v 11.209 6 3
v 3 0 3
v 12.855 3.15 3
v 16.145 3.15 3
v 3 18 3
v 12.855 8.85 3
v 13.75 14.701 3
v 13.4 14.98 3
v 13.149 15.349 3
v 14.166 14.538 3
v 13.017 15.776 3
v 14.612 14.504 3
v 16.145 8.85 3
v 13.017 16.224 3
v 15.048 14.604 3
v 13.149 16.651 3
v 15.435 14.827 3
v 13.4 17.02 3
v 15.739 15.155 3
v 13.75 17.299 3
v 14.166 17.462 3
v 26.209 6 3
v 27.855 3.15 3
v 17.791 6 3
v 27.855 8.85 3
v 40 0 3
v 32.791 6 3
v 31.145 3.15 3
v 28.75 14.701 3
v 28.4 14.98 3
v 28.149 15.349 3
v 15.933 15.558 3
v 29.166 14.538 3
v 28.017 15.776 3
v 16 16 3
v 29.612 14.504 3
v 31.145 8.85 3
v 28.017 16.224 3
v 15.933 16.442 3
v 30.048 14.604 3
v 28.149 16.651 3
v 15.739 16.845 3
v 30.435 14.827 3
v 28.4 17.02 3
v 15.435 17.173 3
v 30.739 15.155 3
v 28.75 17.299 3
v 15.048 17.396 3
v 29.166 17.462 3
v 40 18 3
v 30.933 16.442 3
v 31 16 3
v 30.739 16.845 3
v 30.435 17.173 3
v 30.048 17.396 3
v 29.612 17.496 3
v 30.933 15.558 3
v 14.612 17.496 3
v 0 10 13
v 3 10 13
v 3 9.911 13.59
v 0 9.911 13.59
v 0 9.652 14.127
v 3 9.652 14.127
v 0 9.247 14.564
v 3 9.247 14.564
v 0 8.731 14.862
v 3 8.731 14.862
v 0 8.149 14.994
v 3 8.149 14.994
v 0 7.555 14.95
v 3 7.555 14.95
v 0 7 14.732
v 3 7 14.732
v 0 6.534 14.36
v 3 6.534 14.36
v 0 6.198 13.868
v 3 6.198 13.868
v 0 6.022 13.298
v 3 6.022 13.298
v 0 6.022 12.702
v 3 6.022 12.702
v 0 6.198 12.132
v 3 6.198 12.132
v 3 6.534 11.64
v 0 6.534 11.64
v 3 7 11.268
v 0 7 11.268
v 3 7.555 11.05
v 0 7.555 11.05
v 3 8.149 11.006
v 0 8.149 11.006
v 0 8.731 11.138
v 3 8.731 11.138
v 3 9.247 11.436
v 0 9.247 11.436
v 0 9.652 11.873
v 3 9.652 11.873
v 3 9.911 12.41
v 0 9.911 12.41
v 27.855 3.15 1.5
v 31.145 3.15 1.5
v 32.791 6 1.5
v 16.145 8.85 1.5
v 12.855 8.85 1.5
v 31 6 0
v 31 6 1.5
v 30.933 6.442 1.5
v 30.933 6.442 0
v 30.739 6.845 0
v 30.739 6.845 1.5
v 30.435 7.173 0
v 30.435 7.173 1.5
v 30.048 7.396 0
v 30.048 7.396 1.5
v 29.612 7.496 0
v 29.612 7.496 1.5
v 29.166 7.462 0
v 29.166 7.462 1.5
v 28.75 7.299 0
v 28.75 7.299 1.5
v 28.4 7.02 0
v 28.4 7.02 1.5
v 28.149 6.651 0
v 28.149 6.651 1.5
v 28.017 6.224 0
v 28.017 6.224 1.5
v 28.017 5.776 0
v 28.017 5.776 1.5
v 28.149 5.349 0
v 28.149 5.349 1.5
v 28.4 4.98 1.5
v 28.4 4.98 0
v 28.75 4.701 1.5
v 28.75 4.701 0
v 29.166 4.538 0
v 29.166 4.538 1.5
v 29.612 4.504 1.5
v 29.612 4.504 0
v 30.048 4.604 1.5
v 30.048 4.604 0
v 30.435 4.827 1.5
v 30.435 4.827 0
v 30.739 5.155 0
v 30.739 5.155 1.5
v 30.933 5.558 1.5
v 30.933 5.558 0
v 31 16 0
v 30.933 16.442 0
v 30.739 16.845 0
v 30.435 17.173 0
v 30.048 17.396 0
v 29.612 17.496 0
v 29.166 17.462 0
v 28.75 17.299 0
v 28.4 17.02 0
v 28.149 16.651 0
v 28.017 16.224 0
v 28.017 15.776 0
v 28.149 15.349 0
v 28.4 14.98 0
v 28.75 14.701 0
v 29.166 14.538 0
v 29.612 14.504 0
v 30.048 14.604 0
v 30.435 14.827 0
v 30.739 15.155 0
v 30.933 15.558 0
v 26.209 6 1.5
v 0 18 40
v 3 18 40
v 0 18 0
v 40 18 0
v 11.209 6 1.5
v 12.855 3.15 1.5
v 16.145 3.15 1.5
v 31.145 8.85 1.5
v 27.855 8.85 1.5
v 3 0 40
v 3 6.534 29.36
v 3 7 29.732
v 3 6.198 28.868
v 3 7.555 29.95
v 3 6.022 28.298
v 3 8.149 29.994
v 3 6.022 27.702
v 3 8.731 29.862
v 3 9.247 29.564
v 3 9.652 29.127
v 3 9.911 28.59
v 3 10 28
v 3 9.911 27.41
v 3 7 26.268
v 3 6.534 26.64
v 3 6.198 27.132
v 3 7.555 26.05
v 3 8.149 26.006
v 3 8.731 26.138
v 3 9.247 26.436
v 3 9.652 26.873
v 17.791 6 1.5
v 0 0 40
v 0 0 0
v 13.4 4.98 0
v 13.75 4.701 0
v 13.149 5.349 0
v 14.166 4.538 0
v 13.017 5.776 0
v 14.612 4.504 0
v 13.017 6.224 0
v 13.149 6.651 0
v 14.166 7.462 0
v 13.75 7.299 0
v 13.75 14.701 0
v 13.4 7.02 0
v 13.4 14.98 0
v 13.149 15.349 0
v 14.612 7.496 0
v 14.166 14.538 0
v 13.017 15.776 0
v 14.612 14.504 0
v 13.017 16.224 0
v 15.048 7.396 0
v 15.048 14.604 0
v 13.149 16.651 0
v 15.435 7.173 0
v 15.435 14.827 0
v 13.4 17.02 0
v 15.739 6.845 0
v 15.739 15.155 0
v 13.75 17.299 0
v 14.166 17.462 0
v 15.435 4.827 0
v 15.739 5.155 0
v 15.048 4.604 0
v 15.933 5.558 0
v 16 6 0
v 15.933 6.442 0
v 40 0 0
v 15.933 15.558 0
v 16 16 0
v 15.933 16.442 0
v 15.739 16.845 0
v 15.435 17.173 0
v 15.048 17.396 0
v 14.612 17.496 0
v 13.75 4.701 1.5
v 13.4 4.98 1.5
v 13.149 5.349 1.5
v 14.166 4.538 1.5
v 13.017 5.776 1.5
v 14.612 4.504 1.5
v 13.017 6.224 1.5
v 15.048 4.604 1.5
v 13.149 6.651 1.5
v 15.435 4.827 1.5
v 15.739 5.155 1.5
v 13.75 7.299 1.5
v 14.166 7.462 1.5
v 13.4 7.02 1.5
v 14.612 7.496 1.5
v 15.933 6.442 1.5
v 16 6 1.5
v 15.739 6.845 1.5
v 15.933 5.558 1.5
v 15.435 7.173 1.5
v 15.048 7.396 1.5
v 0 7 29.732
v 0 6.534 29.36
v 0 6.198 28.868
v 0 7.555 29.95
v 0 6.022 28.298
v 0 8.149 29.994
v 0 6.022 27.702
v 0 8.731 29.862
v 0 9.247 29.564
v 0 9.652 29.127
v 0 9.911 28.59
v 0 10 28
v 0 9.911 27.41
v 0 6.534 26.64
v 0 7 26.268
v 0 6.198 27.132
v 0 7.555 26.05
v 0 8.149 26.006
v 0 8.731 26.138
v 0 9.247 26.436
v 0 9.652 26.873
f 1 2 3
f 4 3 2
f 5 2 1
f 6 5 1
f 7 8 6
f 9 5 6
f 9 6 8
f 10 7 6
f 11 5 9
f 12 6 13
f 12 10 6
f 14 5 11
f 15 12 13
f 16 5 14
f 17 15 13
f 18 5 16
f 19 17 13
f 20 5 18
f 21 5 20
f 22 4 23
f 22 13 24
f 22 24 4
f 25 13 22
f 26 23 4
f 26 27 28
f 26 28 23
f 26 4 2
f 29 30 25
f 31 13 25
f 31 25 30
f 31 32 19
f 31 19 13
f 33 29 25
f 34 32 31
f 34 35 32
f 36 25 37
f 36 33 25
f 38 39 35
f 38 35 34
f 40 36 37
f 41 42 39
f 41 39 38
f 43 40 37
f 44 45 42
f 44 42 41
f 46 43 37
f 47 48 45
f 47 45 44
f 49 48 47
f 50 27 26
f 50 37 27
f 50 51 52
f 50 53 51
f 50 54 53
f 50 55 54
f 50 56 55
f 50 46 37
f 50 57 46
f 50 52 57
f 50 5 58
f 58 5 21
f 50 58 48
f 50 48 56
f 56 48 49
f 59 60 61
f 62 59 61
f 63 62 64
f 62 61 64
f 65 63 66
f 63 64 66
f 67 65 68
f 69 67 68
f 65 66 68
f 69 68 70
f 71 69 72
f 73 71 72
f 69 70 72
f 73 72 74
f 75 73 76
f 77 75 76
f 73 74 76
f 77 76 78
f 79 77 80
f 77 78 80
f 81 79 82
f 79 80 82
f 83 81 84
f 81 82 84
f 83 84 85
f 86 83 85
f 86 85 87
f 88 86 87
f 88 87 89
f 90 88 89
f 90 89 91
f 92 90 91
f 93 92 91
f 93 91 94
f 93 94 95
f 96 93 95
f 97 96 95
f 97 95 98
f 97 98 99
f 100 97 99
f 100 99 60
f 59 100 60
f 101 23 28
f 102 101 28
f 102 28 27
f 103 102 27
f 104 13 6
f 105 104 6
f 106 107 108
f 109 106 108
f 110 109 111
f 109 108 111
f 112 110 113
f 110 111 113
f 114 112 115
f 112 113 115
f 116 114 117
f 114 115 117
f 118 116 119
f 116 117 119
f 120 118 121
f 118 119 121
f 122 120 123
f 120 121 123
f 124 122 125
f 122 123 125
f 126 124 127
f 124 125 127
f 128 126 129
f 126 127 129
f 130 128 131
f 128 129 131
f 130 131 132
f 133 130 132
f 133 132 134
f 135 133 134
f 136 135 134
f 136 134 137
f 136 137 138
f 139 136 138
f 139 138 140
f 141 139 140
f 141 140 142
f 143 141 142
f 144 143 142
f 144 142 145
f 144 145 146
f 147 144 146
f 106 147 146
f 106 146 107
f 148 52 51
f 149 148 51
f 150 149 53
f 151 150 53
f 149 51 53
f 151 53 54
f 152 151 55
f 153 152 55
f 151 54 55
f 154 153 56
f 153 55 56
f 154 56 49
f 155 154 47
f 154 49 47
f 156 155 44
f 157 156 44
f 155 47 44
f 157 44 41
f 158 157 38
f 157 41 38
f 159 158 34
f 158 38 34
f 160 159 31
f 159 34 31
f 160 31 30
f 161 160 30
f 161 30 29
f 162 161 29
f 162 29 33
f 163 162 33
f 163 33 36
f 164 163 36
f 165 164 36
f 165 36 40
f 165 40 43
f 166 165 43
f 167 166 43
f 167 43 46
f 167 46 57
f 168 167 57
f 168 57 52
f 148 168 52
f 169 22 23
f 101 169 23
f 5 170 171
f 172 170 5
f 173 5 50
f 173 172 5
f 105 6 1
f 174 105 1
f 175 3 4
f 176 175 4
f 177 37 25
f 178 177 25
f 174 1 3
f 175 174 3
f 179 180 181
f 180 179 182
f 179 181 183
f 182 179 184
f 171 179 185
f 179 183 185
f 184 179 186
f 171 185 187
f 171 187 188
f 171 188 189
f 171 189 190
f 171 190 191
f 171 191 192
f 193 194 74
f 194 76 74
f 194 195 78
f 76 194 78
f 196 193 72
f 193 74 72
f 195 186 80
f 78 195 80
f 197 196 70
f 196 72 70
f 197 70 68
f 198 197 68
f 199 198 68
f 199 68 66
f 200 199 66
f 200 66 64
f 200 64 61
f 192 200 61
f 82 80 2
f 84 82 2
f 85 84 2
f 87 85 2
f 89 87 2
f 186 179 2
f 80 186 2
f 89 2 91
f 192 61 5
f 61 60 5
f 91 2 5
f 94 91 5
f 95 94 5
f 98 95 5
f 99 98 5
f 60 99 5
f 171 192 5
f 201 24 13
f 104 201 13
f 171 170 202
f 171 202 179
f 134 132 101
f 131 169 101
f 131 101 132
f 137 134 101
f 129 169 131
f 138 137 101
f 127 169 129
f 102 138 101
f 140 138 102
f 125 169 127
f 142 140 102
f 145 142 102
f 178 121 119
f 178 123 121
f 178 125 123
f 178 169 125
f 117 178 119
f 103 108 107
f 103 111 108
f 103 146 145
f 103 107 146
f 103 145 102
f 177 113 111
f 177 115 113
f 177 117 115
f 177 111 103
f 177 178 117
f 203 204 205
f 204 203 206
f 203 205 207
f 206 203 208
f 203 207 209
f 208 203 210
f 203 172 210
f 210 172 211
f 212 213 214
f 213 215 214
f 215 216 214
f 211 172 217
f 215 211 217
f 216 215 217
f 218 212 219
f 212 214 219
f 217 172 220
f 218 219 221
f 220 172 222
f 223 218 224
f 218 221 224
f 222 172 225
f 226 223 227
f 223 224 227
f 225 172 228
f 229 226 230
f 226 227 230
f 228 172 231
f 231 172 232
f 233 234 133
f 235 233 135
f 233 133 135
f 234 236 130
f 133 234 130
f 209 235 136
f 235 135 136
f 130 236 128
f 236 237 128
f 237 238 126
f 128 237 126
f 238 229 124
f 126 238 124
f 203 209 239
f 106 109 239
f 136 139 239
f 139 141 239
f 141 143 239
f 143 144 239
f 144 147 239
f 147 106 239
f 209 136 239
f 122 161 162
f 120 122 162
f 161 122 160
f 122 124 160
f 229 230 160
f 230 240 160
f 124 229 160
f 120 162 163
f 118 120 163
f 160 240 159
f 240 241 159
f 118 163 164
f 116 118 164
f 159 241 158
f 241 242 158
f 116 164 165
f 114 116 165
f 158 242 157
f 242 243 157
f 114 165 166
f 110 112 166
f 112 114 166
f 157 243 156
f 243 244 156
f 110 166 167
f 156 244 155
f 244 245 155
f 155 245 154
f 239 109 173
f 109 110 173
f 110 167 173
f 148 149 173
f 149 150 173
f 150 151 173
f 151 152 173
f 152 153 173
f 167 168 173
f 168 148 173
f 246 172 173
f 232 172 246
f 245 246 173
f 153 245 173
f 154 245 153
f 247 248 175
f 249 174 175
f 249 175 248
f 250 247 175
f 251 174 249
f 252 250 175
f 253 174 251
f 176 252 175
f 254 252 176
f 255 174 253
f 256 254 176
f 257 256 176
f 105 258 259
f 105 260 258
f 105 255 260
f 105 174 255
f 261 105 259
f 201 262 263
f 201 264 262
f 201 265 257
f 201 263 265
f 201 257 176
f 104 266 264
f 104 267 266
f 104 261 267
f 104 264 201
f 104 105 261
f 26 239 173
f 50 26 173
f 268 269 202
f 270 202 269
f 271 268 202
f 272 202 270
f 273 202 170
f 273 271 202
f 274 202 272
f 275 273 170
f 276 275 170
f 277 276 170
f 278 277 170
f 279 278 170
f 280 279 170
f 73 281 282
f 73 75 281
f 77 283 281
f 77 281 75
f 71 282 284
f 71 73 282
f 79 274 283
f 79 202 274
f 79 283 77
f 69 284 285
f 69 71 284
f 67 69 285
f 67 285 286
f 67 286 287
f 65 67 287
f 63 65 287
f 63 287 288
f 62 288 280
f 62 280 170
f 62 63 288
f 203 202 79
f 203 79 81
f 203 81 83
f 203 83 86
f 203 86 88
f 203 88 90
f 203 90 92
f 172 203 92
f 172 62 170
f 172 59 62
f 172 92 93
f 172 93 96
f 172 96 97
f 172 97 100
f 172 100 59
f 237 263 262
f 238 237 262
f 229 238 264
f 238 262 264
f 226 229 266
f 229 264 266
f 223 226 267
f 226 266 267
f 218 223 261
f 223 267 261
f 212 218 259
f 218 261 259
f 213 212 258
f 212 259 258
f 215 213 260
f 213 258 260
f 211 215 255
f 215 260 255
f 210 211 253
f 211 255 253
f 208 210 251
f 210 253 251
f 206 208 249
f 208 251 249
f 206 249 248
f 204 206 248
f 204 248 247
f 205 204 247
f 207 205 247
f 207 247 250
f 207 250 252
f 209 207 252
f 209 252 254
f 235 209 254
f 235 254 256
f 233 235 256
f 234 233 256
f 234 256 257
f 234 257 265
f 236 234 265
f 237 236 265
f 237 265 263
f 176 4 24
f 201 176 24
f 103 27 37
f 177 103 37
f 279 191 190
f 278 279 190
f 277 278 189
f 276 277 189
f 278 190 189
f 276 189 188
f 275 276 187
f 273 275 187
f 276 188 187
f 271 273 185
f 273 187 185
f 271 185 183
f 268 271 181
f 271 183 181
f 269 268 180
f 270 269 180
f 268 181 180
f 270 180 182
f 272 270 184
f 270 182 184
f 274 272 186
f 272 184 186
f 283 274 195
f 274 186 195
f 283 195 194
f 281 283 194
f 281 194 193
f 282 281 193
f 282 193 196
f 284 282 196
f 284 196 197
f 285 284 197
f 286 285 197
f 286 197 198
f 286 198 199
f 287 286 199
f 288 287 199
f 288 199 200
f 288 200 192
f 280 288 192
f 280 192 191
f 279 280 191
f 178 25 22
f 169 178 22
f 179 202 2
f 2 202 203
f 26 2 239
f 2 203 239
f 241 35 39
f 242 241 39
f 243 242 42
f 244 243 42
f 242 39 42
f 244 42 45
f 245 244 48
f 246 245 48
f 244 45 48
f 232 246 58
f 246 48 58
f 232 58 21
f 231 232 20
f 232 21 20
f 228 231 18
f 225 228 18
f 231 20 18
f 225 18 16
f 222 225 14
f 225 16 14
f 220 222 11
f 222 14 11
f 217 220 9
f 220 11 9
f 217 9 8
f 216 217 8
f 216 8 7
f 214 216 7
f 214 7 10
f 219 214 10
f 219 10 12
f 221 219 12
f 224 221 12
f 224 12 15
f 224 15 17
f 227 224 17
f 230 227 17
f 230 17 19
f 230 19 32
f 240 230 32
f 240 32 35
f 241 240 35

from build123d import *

# Parameters (mm, degrees)
ESQUISSE1_W             = 40
ESQUISSE1_H             = 18
BOSS_EXTRU_1_DEPTH      = 3
ESQUISSE2_W             = 3
ESQUISSE2_H             = 18
BOSS_EXTRU_2_DEPTH      = 37
ESQUISSE3_R             = 1.5
ENL_V_MAT_EXTRU_1_DEPTH = 58.384666942
ESQUISSE4_R             = 2
ENL_V_MAT_EXTRU_2_DEPTH = 58.384666942
ENL_V_MAT_EXTRU_3_DEPTH = 1.5


with BuildPart() as part:
    # Esquisse1 → Boss.-Extru.1 (new body)
    with BuildSketch(Plane.XY):
        with Locations((20, 9)):
            Rectangle(ESQUISSE1_W, ESQUISSE1_H)
    extrude(amount=BOSS_EXTRU_1_DEPTH)

    # Esquisse2 → Boss.-Extru.2 (add)
    with BuildSketch(Plane.XY.offset(3)):
        with Locations((1.5, 9)):
            Rectangle(ESQUISSE2_W, ESQUISSE2_H)
    extrude(amount=BOSS_EXTRU_2_DEPTH)

    # Esquisse3 → Enlèv. mat.-Extru.1 (cut, through all)
    with BuildSketch(Plane.XY.offset(3)):
        with Locations((14.5, 16)):
            Circle(ESQUISSE3_R)
        with Locations((29.5, 16)):
            Circle(ESQUISSE3_R)
        with Locations((14.5, 6)):
            Circle(ESQUISSE3_R)
        with Locations((29.5, 6)):
            Circle(ESQUISSE3_R)
    extrude(amount=-ENL_V_MAT_EXTRU_1_DEPTH, mode=Mode.SUBTRACT)

    # Esquisse4 → Enlèv. mat.-Extru.2 (cut, through all)
    with BuildSketch(Plane(origin=(3, 0, 0), x_dir=(0, 0, -1), z_dir=(1, 0, 0))):
        with Locations(Location((-28, 8, 0), (0, 0, 90))):
            Circle(ESQUISSE4_R)
        with Locations(Location((-13, 8, 0), (0, 0, 90))):
            Circle(ESQUISSE4_R)
    extrude(amount=-ENL_V_MAT_EXTRU_2_DEPTH, mode=Mode.SUBTRACT)

    # Esquisse5 → Enlèv. mat.-Extru.3 (cut)
    with BuildSketch(Plane.XY.offset(3)):
        Polygon((16.145448267, 8.85), (12.854551733, 8.85), (11.209103466, 6), (12.854551733, 3.15), (16.145448267, 3.15), (17.790896534, 6), align=None)
        Polygon((31.145448267, 8.85), (27.854551733, 8.85), (26.209103466, 6), (27.854551733, 3.15), (31.145448267, 3.15), (32.790896534, 6), align=None)
    extrude(amount=-ENL_V_MAT_EXTRU_3_DEPTH, mode=Mode.SUBTRACT)


solid = part.part
